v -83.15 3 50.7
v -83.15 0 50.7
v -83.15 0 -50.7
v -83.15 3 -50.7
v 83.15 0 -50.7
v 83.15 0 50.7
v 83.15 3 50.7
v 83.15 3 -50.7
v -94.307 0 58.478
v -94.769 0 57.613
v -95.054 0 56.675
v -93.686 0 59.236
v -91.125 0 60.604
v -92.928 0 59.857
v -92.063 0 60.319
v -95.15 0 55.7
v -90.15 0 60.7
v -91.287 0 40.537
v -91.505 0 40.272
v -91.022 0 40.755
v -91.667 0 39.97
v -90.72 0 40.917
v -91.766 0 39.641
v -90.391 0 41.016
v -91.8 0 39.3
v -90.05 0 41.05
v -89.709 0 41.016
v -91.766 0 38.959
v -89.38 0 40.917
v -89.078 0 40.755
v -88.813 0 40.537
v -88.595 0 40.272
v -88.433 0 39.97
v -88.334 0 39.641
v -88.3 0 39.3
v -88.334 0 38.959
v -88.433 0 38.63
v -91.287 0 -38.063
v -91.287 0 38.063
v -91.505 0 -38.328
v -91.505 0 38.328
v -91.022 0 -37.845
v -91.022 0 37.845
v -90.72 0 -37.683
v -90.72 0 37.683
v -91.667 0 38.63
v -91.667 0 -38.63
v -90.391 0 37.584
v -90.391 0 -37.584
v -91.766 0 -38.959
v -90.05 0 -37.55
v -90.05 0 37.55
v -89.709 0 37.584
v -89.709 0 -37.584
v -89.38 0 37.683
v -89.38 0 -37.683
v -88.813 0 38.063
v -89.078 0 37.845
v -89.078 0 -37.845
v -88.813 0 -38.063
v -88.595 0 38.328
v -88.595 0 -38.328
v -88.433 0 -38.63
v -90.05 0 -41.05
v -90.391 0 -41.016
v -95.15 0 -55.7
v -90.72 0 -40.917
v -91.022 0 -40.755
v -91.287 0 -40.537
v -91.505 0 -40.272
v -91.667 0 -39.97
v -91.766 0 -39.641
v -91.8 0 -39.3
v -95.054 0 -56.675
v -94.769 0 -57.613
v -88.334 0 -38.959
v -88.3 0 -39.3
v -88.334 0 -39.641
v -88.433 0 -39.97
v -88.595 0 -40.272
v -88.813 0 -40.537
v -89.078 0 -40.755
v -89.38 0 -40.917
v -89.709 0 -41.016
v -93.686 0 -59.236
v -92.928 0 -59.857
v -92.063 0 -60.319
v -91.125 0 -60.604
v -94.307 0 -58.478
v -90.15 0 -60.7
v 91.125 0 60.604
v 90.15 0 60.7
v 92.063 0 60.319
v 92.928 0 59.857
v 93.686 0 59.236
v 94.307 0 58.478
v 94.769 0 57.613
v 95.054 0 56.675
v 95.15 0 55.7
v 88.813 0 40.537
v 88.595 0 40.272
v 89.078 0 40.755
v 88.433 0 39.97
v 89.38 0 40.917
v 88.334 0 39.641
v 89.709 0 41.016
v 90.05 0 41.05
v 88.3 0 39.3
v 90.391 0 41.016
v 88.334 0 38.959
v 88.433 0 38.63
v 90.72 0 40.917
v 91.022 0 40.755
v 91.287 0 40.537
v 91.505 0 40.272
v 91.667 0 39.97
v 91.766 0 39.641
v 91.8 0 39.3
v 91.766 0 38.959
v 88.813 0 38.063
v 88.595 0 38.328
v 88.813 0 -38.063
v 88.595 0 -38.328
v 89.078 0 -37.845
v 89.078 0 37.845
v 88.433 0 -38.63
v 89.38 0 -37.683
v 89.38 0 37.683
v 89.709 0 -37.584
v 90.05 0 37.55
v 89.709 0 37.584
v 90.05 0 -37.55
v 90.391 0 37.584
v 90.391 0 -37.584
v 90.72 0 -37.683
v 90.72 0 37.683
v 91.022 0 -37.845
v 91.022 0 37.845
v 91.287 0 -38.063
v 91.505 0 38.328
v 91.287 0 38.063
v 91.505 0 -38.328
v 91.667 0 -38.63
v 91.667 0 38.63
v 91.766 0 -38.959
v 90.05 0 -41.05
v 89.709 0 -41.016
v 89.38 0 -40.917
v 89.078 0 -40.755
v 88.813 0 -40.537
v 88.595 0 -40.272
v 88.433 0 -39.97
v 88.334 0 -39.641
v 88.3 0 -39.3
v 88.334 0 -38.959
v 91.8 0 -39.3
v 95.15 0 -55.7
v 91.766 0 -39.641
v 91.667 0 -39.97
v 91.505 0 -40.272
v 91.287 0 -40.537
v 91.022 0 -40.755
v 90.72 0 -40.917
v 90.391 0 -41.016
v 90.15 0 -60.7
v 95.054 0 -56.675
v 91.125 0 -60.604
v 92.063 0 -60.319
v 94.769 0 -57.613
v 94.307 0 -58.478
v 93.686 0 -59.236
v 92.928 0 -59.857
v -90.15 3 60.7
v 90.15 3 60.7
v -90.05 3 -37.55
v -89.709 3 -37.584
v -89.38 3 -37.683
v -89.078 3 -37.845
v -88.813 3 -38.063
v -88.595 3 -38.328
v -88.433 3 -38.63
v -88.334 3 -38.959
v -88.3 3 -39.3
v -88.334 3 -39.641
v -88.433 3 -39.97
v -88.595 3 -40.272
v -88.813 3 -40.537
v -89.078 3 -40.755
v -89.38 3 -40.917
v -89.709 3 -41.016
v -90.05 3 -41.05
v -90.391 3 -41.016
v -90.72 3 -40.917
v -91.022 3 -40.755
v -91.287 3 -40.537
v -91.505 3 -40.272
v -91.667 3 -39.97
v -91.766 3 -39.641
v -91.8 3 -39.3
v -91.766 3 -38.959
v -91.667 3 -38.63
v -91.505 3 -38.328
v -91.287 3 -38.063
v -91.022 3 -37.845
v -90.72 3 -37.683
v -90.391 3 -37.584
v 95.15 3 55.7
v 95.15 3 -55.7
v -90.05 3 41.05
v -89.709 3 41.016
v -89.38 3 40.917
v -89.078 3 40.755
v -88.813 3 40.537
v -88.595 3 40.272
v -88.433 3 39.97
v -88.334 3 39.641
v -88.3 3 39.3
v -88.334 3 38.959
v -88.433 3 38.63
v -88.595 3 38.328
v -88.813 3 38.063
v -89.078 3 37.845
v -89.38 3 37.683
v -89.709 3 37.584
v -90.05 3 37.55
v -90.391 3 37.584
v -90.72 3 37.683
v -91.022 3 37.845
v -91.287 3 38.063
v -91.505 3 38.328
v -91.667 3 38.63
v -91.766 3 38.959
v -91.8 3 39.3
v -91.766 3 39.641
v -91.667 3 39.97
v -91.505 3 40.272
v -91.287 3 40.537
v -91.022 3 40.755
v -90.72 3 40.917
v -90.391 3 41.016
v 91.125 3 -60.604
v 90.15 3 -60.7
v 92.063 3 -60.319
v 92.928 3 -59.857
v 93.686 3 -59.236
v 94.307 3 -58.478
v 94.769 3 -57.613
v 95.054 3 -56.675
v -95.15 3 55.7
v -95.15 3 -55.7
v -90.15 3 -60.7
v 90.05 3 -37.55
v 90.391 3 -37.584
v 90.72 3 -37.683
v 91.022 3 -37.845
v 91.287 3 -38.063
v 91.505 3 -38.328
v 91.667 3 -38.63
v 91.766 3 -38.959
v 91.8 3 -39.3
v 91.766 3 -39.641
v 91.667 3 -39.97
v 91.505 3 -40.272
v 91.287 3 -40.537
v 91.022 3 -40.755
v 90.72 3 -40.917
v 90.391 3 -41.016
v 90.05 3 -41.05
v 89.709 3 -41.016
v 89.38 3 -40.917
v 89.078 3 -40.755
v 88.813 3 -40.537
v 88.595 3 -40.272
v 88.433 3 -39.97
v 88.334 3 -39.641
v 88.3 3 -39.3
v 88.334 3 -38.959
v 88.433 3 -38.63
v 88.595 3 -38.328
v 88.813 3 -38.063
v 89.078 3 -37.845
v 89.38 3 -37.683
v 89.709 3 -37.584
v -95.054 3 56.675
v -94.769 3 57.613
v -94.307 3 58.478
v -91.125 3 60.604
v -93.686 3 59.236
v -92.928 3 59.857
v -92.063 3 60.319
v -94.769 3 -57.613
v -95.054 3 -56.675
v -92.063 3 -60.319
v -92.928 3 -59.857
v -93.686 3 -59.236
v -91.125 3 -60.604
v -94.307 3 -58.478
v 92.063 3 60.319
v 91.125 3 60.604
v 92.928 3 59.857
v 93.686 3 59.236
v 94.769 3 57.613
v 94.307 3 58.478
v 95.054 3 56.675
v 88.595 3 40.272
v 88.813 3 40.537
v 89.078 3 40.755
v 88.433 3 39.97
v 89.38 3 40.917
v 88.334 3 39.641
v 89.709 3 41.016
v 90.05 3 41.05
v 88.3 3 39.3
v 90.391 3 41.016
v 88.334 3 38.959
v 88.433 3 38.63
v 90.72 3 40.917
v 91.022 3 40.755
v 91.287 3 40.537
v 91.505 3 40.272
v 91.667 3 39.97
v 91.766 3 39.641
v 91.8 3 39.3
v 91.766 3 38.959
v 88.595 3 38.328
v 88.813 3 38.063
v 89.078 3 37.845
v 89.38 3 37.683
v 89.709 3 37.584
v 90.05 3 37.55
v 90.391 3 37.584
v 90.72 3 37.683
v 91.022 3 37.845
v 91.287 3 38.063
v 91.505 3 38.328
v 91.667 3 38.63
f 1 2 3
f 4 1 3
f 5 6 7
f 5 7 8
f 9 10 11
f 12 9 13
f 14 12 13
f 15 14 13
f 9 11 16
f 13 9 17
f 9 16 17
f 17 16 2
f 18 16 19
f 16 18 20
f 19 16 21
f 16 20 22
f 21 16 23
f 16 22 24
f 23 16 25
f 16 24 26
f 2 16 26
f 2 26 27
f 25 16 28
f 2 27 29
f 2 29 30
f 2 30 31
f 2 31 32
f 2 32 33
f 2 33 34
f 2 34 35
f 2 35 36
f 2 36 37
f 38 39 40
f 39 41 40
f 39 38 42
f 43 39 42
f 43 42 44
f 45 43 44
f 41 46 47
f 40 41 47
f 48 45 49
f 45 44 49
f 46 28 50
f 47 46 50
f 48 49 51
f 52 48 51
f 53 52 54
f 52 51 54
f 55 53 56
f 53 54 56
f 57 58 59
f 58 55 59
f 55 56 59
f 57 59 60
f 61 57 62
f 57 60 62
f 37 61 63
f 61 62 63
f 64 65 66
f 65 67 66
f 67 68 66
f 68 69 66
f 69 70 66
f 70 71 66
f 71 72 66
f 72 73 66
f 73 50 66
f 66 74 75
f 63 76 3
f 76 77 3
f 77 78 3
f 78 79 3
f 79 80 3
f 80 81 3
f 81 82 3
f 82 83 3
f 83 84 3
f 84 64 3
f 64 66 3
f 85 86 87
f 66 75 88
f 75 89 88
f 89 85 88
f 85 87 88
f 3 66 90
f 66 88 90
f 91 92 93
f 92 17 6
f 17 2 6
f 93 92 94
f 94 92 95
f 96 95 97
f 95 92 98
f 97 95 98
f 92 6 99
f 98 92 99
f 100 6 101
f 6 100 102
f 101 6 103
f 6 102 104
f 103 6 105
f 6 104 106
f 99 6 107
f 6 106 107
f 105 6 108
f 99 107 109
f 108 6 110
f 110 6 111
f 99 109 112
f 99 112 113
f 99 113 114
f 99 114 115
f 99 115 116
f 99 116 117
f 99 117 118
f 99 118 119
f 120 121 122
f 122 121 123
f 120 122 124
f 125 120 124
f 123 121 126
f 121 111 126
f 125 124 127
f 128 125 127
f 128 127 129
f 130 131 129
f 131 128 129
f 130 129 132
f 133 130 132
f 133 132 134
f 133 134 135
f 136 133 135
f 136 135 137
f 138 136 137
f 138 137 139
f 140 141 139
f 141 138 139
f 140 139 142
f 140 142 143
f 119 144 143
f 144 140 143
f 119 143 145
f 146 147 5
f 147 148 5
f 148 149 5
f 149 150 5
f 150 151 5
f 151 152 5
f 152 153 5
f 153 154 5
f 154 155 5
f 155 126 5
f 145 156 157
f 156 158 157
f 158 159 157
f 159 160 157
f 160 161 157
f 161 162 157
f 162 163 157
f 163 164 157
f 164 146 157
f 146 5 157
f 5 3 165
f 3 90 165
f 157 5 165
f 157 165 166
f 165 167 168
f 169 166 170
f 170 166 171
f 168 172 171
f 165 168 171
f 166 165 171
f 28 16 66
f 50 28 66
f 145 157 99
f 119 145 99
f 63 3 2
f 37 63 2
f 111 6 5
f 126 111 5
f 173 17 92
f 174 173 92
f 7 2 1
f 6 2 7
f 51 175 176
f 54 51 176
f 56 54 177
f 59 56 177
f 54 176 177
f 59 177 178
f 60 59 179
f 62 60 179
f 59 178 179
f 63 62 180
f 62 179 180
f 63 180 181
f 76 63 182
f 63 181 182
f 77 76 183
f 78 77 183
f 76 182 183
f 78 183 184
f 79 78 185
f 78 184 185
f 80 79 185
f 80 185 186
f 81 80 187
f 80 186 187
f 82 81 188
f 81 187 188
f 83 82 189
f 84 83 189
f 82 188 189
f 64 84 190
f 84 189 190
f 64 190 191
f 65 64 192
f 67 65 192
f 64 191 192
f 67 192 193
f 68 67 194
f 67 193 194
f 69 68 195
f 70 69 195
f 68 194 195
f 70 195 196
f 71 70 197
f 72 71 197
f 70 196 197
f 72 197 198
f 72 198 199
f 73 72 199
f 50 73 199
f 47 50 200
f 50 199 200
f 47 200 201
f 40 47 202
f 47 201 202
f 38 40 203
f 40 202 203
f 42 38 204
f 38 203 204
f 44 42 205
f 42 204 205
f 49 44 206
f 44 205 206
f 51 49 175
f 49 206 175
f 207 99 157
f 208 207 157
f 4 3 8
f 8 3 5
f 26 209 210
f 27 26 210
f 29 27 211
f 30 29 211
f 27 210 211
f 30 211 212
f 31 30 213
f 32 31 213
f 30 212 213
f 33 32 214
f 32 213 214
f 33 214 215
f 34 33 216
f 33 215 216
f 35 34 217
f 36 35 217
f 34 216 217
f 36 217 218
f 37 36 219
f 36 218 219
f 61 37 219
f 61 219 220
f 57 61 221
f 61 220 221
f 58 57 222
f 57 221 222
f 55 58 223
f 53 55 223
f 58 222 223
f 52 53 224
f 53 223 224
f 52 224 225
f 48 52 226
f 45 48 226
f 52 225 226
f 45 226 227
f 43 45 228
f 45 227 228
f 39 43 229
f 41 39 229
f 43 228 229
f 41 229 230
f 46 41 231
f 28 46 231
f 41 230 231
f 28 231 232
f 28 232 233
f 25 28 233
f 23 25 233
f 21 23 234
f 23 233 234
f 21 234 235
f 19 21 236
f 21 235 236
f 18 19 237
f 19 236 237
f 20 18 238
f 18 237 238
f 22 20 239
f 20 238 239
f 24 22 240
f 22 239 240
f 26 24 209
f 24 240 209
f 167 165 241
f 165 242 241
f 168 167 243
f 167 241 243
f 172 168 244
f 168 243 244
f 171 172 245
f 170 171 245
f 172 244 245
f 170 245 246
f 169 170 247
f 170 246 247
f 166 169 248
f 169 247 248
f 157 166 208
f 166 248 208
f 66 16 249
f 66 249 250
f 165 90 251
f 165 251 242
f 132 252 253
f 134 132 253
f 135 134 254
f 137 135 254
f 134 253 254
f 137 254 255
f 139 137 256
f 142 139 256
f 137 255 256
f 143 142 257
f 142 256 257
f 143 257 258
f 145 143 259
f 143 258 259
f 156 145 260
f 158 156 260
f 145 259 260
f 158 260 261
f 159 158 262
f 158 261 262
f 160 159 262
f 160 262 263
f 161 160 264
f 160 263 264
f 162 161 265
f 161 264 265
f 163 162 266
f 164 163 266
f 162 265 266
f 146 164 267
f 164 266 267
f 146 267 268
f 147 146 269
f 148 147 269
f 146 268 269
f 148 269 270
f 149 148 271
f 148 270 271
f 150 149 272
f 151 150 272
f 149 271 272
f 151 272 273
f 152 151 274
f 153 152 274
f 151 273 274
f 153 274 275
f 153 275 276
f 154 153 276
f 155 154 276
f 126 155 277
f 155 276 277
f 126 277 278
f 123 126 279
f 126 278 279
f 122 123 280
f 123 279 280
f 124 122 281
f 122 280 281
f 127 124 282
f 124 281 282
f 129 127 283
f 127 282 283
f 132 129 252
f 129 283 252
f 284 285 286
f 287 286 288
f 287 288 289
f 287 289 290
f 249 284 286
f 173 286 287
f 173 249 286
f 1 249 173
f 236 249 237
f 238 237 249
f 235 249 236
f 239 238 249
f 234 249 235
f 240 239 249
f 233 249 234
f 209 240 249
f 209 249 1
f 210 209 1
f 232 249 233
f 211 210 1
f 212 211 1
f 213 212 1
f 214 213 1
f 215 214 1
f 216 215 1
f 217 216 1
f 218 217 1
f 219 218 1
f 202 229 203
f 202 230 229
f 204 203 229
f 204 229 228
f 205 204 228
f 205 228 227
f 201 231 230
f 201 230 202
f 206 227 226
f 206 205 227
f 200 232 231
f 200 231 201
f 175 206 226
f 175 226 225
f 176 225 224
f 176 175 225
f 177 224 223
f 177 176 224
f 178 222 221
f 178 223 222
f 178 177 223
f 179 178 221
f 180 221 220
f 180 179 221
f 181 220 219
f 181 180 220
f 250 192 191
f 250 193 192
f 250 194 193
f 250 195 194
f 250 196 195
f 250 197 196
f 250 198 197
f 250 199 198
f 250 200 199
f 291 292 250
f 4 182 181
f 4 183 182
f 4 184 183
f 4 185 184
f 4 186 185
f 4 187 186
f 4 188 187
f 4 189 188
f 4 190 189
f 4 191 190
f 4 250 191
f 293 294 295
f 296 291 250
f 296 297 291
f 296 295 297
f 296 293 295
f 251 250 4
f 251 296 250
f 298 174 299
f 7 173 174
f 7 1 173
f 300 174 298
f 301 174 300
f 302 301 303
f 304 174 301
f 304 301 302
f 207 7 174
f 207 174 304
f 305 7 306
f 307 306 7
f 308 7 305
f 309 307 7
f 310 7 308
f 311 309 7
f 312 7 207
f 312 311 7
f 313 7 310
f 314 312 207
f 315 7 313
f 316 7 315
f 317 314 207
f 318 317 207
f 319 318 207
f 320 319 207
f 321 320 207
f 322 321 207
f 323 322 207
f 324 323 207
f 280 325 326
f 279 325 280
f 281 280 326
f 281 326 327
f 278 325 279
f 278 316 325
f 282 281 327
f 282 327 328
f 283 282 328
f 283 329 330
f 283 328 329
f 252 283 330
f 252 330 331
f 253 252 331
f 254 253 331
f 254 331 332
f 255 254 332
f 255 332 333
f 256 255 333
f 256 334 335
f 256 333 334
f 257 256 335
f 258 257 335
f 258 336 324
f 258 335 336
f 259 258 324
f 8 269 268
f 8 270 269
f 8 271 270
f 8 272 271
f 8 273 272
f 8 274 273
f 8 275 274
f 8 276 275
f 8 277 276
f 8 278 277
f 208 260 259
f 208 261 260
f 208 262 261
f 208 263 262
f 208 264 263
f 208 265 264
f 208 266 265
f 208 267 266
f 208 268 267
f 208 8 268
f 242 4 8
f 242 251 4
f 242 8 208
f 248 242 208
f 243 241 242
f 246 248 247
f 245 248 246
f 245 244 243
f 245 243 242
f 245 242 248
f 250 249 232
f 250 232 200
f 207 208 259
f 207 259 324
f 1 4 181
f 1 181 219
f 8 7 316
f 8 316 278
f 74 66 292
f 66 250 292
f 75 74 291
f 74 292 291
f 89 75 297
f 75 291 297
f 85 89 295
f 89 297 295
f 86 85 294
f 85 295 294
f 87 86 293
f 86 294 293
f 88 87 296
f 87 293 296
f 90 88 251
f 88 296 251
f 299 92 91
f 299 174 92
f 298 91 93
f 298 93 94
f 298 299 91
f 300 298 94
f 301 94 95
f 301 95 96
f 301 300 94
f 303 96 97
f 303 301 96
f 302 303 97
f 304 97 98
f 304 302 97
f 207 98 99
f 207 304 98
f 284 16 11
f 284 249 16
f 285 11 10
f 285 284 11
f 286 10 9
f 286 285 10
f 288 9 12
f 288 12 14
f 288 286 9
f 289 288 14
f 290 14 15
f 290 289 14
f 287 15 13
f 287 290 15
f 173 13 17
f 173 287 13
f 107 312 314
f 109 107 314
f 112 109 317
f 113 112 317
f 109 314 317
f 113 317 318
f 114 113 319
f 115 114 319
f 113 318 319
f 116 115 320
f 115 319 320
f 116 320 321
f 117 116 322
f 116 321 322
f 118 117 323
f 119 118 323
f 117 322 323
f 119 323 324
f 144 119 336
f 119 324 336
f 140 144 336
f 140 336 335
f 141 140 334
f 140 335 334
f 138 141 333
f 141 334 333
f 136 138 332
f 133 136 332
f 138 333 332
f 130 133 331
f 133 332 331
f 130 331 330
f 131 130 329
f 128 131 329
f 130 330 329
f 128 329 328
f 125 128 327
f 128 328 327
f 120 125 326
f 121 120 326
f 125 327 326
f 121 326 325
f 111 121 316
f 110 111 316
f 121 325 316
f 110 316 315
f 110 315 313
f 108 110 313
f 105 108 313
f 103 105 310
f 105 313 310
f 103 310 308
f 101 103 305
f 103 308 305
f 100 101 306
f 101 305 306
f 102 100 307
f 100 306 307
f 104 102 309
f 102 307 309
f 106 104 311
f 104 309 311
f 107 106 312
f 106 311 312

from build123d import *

# Parameters (mm, degrees)
SKETCH1_W          = 190.3
SKETCH1_H          = 121.4
SKETCH1_W_2        = 166.3
SKETCH1_H_2        = 101.4
EXTRUDE1_DEPTH     = 3
FILLET1_R          = 5
SKETCH2_R          = 1.75
CUT_EXTRUDE1_DEPTH = 3


with BuildPart() as part:
    # Sketch1 → Extrude1 (new body)
    with BuildSketch(Plane(origin=(0, 0, 0), x_dir=(1, 0, 0), z_dir=(0, 1, 0))):
        Rectangle(SKETCH1_W, SKETCH1_H)
        Rectangle(SKETCH1_W_2, SKETCH1_H_2, mode=Mode.SUBTRACT)
    extrude(amount=EXTRUDE1_DEPTH)

    # Fillet1
    fillet1_edges = [part.edges().sort_by_distance(p)[0] for p in [
        (-95.15, 1.5, -60.7),
        (95.15, 1.5, -60.7),
        (95.15, 1.5, 60.7),
        (-95.15, 1.5, 60.7),
    ]]
    fillet(fillet1_edges, radius=FILLET1_R)

    # Sketch2 → Cut-Extrude1 (cut)
    with BuildSketch(Plane(origin=(-128.478742323, 3, 300.3), x_dir=(1, 0, 0), z_dir=(0, 1, 0))):
        with Locations(Location((38.428742323, 339.6, 0), (0, 0, 270))):
            Circle(SKETCH2_R)
        with Locations(Location((218.528742323, 339.6, 0), (0, 0, 270))):
            Circle(SKETCH2_R)
        with Locations(Location((218.528742323, 261, 0), (0, 0, 270))):
            Circle(SKETCH2_R)
        with Locations(Location((38.428742323, 261, 0), (0, 0, 270))):
            Circle(SKETCH2_R)
    extrude(amount=-CUT_EXTRUDE1_DEPTH, mode=Mode.SUBTRACT)


solid = part.part
